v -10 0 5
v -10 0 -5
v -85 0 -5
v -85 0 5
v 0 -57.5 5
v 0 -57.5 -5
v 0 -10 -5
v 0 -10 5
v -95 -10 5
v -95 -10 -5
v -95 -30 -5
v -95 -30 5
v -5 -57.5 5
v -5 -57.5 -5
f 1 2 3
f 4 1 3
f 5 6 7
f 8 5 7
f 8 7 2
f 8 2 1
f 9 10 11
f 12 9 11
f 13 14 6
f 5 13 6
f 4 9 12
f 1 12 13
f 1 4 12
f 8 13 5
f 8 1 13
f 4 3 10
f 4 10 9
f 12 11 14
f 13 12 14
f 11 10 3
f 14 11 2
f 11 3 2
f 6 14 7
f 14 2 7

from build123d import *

# Parameters (mm, degrees)
SM_START               = -5
SM_BASE_FLANGE_1_DEPTH = 10
CHAMFER_1_SIZE         = 10


# Read off the part's stored shape, not the designer's step: Базовая кромка1
with BuildPart() as part:
    # Базовая кромка1 outline → Базовая кромка1 (new body)
    with BuildSketch(Plane.XY.offset(SM_START)):
        Polygon((0, 0), (-95, 0), (-95, -30), (-5, -57.5), (0, -57.5), align=None)
    extrude(amount=SM_BASE_FLANGE_1_DEPTH)

    # Фаска1
    chamfer_1_edges = [part.edges().sort_by_distance(p)[0] for p in [
        (-95, 0, 0),
        (0, 0, 0),
    ]]
    chamfer(chamfer_1_edges, length=CHAMFER_1_SIZE)


solid = part.part
